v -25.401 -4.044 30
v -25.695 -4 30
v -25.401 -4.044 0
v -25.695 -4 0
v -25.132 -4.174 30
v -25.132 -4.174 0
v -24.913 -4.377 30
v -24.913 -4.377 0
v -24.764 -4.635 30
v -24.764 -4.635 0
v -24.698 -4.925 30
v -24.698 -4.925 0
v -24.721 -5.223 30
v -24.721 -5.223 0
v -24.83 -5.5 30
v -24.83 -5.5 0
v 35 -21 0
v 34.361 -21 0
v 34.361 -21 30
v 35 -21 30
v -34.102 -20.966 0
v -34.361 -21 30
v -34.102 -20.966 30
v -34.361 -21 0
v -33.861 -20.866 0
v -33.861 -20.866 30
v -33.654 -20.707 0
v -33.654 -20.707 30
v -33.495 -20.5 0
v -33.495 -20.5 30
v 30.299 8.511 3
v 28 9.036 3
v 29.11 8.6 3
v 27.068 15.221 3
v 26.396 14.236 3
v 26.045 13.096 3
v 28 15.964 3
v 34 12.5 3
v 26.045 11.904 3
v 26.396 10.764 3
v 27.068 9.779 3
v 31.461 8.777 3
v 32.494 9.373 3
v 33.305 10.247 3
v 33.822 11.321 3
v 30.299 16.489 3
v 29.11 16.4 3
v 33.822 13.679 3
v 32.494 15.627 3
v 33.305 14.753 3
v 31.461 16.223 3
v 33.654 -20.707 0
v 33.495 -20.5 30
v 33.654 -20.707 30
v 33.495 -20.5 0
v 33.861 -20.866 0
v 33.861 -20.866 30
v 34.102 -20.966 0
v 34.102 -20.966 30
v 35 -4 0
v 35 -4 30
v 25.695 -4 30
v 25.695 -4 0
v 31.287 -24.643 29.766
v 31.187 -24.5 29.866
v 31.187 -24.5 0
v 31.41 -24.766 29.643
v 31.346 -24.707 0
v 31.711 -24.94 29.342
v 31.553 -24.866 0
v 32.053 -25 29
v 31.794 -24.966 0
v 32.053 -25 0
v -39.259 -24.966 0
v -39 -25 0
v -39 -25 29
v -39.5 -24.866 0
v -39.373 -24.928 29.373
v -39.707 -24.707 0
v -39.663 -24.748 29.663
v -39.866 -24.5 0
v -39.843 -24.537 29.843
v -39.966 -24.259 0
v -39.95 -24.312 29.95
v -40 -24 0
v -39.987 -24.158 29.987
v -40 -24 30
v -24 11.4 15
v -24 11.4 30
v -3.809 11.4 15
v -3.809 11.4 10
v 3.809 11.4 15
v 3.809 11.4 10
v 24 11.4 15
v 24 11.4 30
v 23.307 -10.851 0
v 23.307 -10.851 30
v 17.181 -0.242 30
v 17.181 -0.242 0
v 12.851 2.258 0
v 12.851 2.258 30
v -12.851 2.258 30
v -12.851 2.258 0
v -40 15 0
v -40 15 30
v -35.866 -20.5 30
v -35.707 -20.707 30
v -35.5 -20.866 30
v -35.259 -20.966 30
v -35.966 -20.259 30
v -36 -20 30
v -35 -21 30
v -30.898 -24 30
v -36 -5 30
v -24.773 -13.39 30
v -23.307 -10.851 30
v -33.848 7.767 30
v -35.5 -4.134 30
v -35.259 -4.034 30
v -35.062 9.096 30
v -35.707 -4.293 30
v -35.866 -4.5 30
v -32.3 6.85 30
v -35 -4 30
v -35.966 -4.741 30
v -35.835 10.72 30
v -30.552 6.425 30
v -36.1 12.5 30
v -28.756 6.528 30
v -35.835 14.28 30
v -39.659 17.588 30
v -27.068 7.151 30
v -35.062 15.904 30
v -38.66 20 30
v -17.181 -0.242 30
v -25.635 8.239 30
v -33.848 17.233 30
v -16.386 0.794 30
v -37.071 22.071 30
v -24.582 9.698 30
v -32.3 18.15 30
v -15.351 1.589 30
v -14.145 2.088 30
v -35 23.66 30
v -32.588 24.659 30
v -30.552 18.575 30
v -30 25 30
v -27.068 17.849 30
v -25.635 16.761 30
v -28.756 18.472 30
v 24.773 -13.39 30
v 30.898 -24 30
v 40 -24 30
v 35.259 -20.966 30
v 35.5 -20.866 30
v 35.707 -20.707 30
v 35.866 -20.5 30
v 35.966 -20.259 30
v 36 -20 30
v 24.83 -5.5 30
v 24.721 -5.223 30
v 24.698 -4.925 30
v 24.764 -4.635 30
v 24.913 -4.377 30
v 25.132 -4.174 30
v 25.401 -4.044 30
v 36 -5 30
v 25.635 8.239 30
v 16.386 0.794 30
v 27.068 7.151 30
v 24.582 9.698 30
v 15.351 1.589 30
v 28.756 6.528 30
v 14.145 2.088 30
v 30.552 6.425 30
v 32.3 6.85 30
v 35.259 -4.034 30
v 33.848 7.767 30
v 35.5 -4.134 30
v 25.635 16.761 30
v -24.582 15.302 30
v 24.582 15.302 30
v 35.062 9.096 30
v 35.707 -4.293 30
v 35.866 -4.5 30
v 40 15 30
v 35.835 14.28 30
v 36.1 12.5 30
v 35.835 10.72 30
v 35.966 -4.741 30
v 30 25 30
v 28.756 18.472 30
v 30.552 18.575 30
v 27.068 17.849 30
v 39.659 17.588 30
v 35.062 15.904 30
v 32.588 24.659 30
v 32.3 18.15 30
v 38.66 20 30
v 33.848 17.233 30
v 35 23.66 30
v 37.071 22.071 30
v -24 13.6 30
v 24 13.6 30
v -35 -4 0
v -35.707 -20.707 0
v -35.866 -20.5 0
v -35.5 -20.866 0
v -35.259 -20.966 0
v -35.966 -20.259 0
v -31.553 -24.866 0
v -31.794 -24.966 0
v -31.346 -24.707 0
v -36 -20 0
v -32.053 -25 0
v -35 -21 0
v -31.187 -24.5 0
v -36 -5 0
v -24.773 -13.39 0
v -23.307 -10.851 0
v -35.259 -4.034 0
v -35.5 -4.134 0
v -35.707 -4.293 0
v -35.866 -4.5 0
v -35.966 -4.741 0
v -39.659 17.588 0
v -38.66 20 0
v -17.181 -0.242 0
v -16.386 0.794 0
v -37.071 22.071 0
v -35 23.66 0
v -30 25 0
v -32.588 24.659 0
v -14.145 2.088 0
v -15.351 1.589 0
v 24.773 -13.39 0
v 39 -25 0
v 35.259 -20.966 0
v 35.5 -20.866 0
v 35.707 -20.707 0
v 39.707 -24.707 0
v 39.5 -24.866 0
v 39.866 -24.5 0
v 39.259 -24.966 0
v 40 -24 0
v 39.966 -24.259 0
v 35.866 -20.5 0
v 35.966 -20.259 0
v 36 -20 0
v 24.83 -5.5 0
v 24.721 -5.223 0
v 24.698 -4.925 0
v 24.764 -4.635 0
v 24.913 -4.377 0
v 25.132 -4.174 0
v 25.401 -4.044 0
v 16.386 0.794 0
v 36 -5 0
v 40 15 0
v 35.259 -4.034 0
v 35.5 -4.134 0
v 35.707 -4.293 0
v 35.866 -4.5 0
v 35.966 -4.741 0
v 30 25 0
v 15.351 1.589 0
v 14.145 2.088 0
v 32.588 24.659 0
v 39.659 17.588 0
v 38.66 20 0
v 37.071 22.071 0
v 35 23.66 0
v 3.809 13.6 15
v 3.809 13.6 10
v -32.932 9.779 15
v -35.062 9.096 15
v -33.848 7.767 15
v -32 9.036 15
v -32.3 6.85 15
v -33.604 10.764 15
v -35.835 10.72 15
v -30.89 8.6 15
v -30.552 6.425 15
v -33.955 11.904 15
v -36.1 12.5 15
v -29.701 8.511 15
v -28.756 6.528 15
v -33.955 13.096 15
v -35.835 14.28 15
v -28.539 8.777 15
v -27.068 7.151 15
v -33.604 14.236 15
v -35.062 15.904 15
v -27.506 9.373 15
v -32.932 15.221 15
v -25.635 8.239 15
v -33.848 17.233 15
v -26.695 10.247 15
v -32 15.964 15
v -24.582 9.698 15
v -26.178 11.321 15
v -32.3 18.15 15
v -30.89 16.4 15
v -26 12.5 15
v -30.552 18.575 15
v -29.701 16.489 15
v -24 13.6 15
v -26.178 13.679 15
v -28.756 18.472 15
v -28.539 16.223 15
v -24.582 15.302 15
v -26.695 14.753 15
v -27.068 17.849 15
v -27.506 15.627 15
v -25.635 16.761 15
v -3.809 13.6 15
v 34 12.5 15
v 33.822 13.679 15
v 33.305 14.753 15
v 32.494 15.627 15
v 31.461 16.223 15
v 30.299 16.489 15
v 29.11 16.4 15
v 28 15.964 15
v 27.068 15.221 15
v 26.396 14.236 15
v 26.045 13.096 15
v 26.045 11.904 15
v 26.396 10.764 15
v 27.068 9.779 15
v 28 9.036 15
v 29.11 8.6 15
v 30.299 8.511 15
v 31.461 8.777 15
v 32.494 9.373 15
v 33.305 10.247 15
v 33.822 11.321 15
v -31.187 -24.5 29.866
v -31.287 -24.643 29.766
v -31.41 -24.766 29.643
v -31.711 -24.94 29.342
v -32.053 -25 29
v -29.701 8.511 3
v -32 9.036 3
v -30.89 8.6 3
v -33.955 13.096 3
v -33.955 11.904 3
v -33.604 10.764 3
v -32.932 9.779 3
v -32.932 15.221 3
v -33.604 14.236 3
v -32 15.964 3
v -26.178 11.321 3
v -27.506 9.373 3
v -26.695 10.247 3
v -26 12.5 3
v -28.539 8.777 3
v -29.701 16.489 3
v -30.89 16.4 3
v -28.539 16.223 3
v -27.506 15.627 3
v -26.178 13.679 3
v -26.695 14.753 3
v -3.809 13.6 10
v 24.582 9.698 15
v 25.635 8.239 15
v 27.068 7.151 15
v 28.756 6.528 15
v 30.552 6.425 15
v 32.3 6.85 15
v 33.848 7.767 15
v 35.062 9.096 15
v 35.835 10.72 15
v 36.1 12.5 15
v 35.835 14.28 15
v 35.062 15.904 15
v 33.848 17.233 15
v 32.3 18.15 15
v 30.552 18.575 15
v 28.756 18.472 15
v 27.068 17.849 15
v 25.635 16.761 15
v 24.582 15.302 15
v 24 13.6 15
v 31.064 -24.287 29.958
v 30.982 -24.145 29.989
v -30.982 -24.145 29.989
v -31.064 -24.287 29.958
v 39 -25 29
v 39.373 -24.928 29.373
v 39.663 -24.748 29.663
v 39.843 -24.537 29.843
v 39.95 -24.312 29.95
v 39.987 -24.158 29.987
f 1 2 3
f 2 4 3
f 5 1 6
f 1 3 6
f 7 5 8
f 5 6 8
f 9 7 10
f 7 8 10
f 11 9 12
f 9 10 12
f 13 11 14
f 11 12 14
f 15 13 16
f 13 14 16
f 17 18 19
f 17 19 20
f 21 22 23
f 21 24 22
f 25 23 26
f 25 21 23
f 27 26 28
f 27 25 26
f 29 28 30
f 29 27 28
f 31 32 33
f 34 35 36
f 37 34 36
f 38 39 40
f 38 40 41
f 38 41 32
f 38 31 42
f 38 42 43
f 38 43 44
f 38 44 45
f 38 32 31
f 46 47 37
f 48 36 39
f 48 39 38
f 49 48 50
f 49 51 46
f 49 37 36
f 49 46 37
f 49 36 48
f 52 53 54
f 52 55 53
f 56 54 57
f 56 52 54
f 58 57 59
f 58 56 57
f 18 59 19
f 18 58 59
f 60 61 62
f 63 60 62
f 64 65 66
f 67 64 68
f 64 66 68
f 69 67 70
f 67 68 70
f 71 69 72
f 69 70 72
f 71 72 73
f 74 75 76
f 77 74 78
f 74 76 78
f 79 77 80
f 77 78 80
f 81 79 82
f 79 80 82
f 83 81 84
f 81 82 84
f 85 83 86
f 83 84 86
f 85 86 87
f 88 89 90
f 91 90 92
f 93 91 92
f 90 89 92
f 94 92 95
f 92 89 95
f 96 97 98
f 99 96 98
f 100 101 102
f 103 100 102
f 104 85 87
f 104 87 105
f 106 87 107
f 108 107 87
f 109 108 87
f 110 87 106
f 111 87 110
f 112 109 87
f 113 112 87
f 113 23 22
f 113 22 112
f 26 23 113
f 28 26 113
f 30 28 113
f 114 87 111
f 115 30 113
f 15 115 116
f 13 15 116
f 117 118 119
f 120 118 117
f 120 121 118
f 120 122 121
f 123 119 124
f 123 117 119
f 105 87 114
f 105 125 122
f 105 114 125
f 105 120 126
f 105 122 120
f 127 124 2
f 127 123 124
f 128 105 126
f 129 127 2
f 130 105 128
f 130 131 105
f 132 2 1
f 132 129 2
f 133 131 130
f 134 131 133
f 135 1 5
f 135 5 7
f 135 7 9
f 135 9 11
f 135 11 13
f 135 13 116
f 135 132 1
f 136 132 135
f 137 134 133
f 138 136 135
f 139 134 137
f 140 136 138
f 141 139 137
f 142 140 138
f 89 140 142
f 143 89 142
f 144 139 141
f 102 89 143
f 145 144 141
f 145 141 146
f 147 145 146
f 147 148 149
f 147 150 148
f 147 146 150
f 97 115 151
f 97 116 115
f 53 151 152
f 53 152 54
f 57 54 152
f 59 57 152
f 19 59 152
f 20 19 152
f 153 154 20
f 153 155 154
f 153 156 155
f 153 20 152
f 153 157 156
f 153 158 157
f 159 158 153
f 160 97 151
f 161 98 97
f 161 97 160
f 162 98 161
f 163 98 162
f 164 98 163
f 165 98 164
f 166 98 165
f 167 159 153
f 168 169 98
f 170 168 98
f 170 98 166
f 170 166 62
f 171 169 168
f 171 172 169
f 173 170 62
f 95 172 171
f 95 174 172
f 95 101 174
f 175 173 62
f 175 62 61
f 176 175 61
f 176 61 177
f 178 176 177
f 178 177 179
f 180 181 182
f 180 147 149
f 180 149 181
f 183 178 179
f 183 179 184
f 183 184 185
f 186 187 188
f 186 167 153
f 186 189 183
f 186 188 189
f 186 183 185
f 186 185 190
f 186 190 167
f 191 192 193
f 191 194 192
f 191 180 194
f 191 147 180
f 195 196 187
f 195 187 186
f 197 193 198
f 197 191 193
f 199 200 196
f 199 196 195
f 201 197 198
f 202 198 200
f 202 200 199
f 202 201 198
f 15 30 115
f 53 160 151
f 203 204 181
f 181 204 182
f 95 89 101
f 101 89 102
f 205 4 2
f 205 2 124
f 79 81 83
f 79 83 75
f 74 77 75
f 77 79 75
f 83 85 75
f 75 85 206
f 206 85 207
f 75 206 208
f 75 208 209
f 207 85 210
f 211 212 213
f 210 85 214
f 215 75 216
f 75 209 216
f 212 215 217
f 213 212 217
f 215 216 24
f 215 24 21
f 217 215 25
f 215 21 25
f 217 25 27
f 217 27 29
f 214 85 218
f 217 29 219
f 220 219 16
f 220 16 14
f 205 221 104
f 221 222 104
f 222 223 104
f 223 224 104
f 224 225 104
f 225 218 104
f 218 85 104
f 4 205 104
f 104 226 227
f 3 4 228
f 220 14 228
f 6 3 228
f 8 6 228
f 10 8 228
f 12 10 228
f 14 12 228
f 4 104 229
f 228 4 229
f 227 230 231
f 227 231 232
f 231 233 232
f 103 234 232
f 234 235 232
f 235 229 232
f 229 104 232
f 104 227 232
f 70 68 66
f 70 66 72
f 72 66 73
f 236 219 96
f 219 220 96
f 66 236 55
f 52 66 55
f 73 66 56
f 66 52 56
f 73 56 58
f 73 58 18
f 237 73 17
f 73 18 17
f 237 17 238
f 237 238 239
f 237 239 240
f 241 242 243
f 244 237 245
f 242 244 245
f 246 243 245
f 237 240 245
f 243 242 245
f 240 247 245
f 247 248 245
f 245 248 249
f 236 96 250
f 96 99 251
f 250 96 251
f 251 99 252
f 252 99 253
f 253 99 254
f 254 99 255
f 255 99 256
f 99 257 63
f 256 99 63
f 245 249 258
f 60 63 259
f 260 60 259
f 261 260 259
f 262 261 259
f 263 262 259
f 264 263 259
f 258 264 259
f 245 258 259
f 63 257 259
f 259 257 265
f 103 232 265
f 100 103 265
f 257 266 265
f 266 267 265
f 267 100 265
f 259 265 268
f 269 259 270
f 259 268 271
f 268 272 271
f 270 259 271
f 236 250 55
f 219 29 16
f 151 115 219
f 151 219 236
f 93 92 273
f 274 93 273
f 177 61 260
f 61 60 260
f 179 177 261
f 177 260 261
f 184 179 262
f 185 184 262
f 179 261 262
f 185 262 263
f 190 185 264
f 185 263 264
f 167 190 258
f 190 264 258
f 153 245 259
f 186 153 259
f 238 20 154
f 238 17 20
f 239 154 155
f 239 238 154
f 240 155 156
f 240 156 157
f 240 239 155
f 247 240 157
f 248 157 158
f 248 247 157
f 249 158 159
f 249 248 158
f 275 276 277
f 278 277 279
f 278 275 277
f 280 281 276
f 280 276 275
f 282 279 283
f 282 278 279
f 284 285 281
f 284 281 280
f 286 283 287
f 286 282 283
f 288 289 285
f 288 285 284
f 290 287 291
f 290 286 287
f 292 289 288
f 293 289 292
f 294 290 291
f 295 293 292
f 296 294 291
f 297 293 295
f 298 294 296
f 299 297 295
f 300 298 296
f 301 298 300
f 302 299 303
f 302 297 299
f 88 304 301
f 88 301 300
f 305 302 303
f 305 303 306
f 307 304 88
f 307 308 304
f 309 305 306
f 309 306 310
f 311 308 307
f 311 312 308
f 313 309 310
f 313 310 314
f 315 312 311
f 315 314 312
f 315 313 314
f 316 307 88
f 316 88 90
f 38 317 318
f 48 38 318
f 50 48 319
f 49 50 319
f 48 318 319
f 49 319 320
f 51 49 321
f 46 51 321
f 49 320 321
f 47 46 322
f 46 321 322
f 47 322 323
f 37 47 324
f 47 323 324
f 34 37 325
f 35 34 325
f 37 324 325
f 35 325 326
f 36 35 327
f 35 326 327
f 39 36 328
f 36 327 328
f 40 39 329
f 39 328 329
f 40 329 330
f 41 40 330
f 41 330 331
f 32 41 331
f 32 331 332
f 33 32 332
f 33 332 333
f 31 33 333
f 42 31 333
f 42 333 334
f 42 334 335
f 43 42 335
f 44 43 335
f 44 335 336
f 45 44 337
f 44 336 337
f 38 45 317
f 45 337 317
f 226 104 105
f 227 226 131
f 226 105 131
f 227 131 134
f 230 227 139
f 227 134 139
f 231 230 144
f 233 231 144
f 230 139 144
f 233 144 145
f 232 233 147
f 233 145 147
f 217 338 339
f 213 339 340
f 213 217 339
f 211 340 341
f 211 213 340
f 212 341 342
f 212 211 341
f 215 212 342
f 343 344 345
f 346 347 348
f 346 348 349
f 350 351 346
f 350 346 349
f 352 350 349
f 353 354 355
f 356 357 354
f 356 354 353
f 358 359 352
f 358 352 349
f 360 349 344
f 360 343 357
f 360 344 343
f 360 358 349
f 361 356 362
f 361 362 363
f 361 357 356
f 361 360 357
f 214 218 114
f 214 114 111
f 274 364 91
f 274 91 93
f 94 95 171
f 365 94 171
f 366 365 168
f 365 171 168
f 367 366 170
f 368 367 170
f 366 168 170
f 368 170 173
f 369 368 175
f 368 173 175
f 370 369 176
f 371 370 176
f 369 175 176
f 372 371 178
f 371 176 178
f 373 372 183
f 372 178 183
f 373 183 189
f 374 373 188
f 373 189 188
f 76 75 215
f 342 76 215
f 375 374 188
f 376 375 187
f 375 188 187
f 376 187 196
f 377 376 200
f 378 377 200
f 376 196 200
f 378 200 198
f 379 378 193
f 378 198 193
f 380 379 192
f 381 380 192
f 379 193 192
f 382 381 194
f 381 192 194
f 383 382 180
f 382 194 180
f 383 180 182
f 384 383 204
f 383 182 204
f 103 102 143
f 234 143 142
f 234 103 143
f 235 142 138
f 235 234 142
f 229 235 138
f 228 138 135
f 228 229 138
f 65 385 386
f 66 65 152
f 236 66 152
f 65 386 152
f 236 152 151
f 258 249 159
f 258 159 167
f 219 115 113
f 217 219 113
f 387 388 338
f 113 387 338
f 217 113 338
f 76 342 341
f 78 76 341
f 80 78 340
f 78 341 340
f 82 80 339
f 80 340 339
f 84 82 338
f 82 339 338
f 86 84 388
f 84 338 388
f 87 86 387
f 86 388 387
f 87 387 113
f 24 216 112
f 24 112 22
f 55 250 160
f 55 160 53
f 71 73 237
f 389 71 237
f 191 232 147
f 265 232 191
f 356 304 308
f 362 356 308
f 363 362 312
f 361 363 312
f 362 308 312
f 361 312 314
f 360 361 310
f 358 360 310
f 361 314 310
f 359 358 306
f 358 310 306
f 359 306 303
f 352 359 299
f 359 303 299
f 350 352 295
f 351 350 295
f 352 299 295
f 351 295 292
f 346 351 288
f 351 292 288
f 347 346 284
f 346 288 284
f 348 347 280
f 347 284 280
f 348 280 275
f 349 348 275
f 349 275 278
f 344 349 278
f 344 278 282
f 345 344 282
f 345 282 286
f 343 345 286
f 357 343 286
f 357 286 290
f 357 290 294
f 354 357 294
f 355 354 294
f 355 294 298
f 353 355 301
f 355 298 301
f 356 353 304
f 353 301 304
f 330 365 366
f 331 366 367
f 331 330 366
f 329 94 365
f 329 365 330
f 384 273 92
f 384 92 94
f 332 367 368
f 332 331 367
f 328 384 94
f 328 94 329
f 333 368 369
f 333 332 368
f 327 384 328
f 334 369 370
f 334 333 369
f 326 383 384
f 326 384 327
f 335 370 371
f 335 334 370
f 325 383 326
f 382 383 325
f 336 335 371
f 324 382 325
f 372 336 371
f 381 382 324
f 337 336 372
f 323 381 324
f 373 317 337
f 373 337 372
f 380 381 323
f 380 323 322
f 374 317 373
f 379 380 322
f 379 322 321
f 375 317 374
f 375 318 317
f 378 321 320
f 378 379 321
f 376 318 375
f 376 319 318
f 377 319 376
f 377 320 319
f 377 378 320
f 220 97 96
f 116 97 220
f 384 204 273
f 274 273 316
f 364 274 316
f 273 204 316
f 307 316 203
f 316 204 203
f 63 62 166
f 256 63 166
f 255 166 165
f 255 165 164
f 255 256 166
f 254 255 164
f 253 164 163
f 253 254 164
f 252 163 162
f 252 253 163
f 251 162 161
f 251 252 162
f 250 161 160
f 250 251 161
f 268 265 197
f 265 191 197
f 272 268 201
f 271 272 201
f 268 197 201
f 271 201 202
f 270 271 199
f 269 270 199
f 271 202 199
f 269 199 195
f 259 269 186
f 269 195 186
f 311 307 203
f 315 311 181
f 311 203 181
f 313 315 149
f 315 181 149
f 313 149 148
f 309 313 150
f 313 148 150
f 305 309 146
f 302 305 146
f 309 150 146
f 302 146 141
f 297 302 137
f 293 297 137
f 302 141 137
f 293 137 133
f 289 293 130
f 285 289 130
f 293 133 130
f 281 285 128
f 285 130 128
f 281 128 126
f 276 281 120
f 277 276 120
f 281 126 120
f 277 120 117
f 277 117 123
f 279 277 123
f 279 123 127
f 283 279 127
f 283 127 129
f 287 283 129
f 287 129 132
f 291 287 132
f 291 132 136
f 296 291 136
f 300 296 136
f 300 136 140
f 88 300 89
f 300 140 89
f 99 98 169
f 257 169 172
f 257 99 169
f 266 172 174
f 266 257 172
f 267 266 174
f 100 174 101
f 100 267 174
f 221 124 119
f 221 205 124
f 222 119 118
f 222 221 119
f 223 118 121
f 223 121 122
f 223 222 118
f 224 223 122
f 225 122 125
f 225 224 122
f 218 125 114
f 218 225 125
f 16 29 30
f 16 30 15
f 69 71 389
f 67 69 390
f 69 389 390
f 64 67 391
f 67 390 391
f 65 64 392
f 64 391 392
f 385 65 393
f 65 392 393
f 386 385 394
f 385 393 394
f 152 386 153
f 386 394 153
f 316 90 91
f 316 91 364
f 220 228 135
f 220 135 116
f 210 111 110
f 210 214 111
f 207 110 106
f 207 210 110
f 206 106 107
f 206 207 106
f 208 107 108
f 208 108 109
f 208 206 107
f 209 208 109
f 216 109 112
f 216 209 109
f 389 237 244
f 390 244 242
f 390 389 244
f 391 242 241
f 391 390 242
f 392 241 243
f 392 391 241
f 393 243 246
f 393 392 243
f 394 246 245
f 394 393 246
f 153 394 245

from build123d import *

# Parameters (mm, degrees)
F0_W      = 80
F0_H      = 50
F1_DEPTH  = 30
F3_DEPTH  = 15
F4_R      = 4
F5_DEPTH  = 12
F6_R      = 10
F8_DEPTH  = 30
F9_R      = 5
F11_DEPTH = 32
F12_R     = 1
F13_R     = 1
F14_W     = 7.6178369459
F14_H     = 2.2
F15_DEPTH = 20
F17_DEPTH = 30


with BuildPart() as f1:
    # F0 (on Top) → F1 (new body)
    with BuildSketch(Plane.XY):
        Rectangle(F0_W, F0_H)
    extrude(amount=F1_DEPTH)

    # F2 (on face) → F3 (cut)
    with BuildSketch(Plane.XY.offset(30)):
        with BuildLine():
            ThreePointArc((-26.0503164684, 11.4), (-34.1, 12.5), (-26.0503164684, 13.6))
            Line((-26.0503164684, 13.6), (-24, 13.6))
            ThreePointArc((-24, 13.6), (-36.1, 12.5), (-24, 11.4))
            Line((-24, 11.4), (-26.0503164684, 11.4))
        make_face()
        with BuildLine():
            ThreePointArc((-26.0503164684, 13.6), (-25.9377529322, 13.0551114844), (-25.9, 12.5))
            ThreePointArc((-25.9, 12.5), (-25.9377529322, 11.9448885156), (-26.0503164684, 11.4))
            Line((-26.0503164684, 11.4), (-24, 11.4))
            ThreePointArc((-24, 11.4), (-23.9250514405, 11.9477319491), (-23.9, 12.5))
            ThreePointArc((-23.9, 12.5), (-23.9250514405, 13.0522680509), (-24, 13.6))
            Line((-24, 13.6), (-26.0503164684, 13.6))
        make_face()
        with BuildLine():
            Line((-30, 13.6), (-26.0503164684, 13.6))
            ThreePointArc((-26.0503164684, 13.6), (-34.1, 12.5), (-26.0503164684, 11.4))
            Line((-26.0503164684, 11.4), (-30, 11.4))
            Line((-30, 11.4), (-30, 13.6))
        make_face()
        with BuildLine():
            ThreePointArc((-26.0503164684, 11.4), (-25.9377529322, 11.9448885156), (-25.9, 12.5))
            ThreePointArc((-25.9, 12.5), (-25.9377529322, 13.0551114844), (-26.0503164684, 13.6))
            Line((-26.0503164684, 13.6), (-30, 13.6))
            Line((-30, 13.6), (-30, 11.4))
            Line((-30, 11.4), (-26.0503164684, 11.4))
        make_face()
        with BuildLine():
            Line((-3.8089184729, 13.6), (-24, 13.6))
            ThreePointArc((-24, 13.6), (-23.9250514405, 13.0522680509), (-23.9, 12.5))
            ThreePointArc((-23.9, 12.5), (-23.9250514405, 11.9477319491), (-24, 11.4))
            Line((-24, 11.4), (-3.8089184729, 11.4))
            Line((-3.8089184729, 11.4), (-3.8089184729, 13.6))
        make_face()
        with BuildLine():
            ThreePointArc((36.1, 12.5), (30.5522680509, 18.5749485595), (24, 13.6))
            Line((24, 13.6), (26.0503164684, 13.6))
            ThreePointArc((26.0503164684, 13.6), (30.5551114844, 16.5622470678), (34.1, 12.5))
            ThreePointArc((34.1, 12.5), (30.5551114844, 8.4377529322), (26.0503164684, 11.4))
            Line((26.0503164684, 11.4), (24, 11.4))
            ThreePointArc((24, 11.4), (30.5522680509, 6.4250514405), (36.1, 12.5))
        make_face()
        with BuildLine():
            Line((26.0503164684, 13.6), (24, 13.6))
            ThreePointArc((24, 13.6), (23.9, 12.5), (24, 11.4))
            Line((24, 11.4), (26.0503164684, 11.4))
            ThreePointArc((26.0503164684, 11.4), (25.9, 12.5), (26.0503164684, 13.6))
        make_face()
        with BuildLine():
            Line((30, 13.6), (26.0503164684, 13.6))
            ThreePointArc((26.0503164684, 13.6), (25.9, 12.5), (26.0503164684, 11.4))
            Line((26.0503164684, 11.4), (30, 11.4))
            Line((30, 11.4), (30, 13.6))
        make_face()
        with BuildLine():
            ThreePointArc((34.1, 12.5), (30.5551114844, 16.5622470678), (26.0503164684, 13.6))
            Line((26.0503164684, 13.6), (30, 13.6))
            Line((30, 13.6), (30, 11.4))
            Line((30, 11.4), (26.0503164684, 11.4))
            ThreePointArc((26.0503164684, 11.4), (30.5551114844, 8.4377529322), (34.1, 12.5))
        make_face()
        with BuildLine():
            Line((24, 13.6), (3.8089184729, 13.6))
            Line((3.8089184729, 13.6), (3.8089184729, 11.4))
            Line((3.8089184729, 11.4), (24, 11.4))
            ThreePointArc((24, 11.4), (23.9, 12.5), (24, 13.6))
        make_face()
    extrude(amount=-F3_DEPTH, mode=Mode.SUBTRACT)

    # F4 (on face) → F5 (cut)
    with BuildSketch(Plane.XY.offset(15)):
        with Locations((-30, 12.5)):
            Circle(F4_R)
        with Locations((30, 12.5)):
            Circle(F4_R)
    extrude(amount=-F5_DEPTH, mode=Mode.SUBTRACT)

    # F6
    f6_edges = [f1.edges().sort_by_distance(p)[0] for p in [
        (-40, 25, 15),
        (40, 25, 15),
    ]]
    fillet(f6_edges, radius=F6_R)

    # F7 (on face) → F8 (cut)
    with BuildSketch(Plane.XY.offset(30)):
        Polygon((15.7377014204, 2.2584984545), (-15.7377014204, 2.2584984545), (-31.4754028408, -25), (31.4754028408, -25), align=None)
    extrude(amount=-F8_DEPTH, mode=Mode.SUBTRACT)

    # F9
    f9_edges = [f1.edges().sort_by_distance(p)[0] for p in [
        (15.737701, 2.258498, 15),
        (-15.737701, 2.258498, 15),
    ]]
    fillet(f9_edges, radius=F9_R)

    # F10 (on face) → F11 (cut)
    with BuildSketch(Plane.XY.offset(30)):
        Polygon((-23.9627902868, -4), (-36, -4), (-36, -21), (-33.7840610196, -21), align=None)
        Polygon((36, -4), (23.9627902868, -4), (33.7840610196, -21), (36, -21), align=None)
    extrude(amount=-F11_DEPTH, mode=Mode.SUBTRACT)

    # F12
    f12_edges = [f1.edges().sort_by_distance(p)[0] for p in [
        (-23.96279, -4, 15),
        (-36, -21, 15),
        (-36, -4, 15),
        (-33.784061, -21, 15),
        (23.96279, -4, 15),
        (36, -4, 15),
        (36, -21, 15),
        (33.784061, -21, 15),
    ]]
    fillet(f12_edges, radius=F12_R)

    # F13
    f13_edges = [f1.edges().sort_by_distance(p)[0] for p in [
        (-35.737701, -25, 30),
        (35.737701, -25, 30),
        (-40, -25, 15),
        (-31.475403, -25, 15),
        (31.475403, -25, 15),
        (40, -25, 15),
    ]]
    fillet(f13_edges, radius=F13_R)

    # F14 (on face) → F15 (cut)
    with BuildSketch(Plane.XY.offset(30)):
        with Locations((0, 12.5)):
            Rectangle(F14_W, F14_H)
    extrude(amount=-F15_DEPTH, mode=Mode.SUBTRACT)

    # F16 (on face) → F17 (join)
    with BuildSketch(Plane.XY.offset(30)):
        Polygon((23.3065289789, -10.8510954306), (-23.3065289789, -10.8510954306), (-24.7726006861, -13.390406115), (24.7726006861, -13.390406115), align=None)
    extrude(amount=-F17_DEPTH)


solid = f1.part
